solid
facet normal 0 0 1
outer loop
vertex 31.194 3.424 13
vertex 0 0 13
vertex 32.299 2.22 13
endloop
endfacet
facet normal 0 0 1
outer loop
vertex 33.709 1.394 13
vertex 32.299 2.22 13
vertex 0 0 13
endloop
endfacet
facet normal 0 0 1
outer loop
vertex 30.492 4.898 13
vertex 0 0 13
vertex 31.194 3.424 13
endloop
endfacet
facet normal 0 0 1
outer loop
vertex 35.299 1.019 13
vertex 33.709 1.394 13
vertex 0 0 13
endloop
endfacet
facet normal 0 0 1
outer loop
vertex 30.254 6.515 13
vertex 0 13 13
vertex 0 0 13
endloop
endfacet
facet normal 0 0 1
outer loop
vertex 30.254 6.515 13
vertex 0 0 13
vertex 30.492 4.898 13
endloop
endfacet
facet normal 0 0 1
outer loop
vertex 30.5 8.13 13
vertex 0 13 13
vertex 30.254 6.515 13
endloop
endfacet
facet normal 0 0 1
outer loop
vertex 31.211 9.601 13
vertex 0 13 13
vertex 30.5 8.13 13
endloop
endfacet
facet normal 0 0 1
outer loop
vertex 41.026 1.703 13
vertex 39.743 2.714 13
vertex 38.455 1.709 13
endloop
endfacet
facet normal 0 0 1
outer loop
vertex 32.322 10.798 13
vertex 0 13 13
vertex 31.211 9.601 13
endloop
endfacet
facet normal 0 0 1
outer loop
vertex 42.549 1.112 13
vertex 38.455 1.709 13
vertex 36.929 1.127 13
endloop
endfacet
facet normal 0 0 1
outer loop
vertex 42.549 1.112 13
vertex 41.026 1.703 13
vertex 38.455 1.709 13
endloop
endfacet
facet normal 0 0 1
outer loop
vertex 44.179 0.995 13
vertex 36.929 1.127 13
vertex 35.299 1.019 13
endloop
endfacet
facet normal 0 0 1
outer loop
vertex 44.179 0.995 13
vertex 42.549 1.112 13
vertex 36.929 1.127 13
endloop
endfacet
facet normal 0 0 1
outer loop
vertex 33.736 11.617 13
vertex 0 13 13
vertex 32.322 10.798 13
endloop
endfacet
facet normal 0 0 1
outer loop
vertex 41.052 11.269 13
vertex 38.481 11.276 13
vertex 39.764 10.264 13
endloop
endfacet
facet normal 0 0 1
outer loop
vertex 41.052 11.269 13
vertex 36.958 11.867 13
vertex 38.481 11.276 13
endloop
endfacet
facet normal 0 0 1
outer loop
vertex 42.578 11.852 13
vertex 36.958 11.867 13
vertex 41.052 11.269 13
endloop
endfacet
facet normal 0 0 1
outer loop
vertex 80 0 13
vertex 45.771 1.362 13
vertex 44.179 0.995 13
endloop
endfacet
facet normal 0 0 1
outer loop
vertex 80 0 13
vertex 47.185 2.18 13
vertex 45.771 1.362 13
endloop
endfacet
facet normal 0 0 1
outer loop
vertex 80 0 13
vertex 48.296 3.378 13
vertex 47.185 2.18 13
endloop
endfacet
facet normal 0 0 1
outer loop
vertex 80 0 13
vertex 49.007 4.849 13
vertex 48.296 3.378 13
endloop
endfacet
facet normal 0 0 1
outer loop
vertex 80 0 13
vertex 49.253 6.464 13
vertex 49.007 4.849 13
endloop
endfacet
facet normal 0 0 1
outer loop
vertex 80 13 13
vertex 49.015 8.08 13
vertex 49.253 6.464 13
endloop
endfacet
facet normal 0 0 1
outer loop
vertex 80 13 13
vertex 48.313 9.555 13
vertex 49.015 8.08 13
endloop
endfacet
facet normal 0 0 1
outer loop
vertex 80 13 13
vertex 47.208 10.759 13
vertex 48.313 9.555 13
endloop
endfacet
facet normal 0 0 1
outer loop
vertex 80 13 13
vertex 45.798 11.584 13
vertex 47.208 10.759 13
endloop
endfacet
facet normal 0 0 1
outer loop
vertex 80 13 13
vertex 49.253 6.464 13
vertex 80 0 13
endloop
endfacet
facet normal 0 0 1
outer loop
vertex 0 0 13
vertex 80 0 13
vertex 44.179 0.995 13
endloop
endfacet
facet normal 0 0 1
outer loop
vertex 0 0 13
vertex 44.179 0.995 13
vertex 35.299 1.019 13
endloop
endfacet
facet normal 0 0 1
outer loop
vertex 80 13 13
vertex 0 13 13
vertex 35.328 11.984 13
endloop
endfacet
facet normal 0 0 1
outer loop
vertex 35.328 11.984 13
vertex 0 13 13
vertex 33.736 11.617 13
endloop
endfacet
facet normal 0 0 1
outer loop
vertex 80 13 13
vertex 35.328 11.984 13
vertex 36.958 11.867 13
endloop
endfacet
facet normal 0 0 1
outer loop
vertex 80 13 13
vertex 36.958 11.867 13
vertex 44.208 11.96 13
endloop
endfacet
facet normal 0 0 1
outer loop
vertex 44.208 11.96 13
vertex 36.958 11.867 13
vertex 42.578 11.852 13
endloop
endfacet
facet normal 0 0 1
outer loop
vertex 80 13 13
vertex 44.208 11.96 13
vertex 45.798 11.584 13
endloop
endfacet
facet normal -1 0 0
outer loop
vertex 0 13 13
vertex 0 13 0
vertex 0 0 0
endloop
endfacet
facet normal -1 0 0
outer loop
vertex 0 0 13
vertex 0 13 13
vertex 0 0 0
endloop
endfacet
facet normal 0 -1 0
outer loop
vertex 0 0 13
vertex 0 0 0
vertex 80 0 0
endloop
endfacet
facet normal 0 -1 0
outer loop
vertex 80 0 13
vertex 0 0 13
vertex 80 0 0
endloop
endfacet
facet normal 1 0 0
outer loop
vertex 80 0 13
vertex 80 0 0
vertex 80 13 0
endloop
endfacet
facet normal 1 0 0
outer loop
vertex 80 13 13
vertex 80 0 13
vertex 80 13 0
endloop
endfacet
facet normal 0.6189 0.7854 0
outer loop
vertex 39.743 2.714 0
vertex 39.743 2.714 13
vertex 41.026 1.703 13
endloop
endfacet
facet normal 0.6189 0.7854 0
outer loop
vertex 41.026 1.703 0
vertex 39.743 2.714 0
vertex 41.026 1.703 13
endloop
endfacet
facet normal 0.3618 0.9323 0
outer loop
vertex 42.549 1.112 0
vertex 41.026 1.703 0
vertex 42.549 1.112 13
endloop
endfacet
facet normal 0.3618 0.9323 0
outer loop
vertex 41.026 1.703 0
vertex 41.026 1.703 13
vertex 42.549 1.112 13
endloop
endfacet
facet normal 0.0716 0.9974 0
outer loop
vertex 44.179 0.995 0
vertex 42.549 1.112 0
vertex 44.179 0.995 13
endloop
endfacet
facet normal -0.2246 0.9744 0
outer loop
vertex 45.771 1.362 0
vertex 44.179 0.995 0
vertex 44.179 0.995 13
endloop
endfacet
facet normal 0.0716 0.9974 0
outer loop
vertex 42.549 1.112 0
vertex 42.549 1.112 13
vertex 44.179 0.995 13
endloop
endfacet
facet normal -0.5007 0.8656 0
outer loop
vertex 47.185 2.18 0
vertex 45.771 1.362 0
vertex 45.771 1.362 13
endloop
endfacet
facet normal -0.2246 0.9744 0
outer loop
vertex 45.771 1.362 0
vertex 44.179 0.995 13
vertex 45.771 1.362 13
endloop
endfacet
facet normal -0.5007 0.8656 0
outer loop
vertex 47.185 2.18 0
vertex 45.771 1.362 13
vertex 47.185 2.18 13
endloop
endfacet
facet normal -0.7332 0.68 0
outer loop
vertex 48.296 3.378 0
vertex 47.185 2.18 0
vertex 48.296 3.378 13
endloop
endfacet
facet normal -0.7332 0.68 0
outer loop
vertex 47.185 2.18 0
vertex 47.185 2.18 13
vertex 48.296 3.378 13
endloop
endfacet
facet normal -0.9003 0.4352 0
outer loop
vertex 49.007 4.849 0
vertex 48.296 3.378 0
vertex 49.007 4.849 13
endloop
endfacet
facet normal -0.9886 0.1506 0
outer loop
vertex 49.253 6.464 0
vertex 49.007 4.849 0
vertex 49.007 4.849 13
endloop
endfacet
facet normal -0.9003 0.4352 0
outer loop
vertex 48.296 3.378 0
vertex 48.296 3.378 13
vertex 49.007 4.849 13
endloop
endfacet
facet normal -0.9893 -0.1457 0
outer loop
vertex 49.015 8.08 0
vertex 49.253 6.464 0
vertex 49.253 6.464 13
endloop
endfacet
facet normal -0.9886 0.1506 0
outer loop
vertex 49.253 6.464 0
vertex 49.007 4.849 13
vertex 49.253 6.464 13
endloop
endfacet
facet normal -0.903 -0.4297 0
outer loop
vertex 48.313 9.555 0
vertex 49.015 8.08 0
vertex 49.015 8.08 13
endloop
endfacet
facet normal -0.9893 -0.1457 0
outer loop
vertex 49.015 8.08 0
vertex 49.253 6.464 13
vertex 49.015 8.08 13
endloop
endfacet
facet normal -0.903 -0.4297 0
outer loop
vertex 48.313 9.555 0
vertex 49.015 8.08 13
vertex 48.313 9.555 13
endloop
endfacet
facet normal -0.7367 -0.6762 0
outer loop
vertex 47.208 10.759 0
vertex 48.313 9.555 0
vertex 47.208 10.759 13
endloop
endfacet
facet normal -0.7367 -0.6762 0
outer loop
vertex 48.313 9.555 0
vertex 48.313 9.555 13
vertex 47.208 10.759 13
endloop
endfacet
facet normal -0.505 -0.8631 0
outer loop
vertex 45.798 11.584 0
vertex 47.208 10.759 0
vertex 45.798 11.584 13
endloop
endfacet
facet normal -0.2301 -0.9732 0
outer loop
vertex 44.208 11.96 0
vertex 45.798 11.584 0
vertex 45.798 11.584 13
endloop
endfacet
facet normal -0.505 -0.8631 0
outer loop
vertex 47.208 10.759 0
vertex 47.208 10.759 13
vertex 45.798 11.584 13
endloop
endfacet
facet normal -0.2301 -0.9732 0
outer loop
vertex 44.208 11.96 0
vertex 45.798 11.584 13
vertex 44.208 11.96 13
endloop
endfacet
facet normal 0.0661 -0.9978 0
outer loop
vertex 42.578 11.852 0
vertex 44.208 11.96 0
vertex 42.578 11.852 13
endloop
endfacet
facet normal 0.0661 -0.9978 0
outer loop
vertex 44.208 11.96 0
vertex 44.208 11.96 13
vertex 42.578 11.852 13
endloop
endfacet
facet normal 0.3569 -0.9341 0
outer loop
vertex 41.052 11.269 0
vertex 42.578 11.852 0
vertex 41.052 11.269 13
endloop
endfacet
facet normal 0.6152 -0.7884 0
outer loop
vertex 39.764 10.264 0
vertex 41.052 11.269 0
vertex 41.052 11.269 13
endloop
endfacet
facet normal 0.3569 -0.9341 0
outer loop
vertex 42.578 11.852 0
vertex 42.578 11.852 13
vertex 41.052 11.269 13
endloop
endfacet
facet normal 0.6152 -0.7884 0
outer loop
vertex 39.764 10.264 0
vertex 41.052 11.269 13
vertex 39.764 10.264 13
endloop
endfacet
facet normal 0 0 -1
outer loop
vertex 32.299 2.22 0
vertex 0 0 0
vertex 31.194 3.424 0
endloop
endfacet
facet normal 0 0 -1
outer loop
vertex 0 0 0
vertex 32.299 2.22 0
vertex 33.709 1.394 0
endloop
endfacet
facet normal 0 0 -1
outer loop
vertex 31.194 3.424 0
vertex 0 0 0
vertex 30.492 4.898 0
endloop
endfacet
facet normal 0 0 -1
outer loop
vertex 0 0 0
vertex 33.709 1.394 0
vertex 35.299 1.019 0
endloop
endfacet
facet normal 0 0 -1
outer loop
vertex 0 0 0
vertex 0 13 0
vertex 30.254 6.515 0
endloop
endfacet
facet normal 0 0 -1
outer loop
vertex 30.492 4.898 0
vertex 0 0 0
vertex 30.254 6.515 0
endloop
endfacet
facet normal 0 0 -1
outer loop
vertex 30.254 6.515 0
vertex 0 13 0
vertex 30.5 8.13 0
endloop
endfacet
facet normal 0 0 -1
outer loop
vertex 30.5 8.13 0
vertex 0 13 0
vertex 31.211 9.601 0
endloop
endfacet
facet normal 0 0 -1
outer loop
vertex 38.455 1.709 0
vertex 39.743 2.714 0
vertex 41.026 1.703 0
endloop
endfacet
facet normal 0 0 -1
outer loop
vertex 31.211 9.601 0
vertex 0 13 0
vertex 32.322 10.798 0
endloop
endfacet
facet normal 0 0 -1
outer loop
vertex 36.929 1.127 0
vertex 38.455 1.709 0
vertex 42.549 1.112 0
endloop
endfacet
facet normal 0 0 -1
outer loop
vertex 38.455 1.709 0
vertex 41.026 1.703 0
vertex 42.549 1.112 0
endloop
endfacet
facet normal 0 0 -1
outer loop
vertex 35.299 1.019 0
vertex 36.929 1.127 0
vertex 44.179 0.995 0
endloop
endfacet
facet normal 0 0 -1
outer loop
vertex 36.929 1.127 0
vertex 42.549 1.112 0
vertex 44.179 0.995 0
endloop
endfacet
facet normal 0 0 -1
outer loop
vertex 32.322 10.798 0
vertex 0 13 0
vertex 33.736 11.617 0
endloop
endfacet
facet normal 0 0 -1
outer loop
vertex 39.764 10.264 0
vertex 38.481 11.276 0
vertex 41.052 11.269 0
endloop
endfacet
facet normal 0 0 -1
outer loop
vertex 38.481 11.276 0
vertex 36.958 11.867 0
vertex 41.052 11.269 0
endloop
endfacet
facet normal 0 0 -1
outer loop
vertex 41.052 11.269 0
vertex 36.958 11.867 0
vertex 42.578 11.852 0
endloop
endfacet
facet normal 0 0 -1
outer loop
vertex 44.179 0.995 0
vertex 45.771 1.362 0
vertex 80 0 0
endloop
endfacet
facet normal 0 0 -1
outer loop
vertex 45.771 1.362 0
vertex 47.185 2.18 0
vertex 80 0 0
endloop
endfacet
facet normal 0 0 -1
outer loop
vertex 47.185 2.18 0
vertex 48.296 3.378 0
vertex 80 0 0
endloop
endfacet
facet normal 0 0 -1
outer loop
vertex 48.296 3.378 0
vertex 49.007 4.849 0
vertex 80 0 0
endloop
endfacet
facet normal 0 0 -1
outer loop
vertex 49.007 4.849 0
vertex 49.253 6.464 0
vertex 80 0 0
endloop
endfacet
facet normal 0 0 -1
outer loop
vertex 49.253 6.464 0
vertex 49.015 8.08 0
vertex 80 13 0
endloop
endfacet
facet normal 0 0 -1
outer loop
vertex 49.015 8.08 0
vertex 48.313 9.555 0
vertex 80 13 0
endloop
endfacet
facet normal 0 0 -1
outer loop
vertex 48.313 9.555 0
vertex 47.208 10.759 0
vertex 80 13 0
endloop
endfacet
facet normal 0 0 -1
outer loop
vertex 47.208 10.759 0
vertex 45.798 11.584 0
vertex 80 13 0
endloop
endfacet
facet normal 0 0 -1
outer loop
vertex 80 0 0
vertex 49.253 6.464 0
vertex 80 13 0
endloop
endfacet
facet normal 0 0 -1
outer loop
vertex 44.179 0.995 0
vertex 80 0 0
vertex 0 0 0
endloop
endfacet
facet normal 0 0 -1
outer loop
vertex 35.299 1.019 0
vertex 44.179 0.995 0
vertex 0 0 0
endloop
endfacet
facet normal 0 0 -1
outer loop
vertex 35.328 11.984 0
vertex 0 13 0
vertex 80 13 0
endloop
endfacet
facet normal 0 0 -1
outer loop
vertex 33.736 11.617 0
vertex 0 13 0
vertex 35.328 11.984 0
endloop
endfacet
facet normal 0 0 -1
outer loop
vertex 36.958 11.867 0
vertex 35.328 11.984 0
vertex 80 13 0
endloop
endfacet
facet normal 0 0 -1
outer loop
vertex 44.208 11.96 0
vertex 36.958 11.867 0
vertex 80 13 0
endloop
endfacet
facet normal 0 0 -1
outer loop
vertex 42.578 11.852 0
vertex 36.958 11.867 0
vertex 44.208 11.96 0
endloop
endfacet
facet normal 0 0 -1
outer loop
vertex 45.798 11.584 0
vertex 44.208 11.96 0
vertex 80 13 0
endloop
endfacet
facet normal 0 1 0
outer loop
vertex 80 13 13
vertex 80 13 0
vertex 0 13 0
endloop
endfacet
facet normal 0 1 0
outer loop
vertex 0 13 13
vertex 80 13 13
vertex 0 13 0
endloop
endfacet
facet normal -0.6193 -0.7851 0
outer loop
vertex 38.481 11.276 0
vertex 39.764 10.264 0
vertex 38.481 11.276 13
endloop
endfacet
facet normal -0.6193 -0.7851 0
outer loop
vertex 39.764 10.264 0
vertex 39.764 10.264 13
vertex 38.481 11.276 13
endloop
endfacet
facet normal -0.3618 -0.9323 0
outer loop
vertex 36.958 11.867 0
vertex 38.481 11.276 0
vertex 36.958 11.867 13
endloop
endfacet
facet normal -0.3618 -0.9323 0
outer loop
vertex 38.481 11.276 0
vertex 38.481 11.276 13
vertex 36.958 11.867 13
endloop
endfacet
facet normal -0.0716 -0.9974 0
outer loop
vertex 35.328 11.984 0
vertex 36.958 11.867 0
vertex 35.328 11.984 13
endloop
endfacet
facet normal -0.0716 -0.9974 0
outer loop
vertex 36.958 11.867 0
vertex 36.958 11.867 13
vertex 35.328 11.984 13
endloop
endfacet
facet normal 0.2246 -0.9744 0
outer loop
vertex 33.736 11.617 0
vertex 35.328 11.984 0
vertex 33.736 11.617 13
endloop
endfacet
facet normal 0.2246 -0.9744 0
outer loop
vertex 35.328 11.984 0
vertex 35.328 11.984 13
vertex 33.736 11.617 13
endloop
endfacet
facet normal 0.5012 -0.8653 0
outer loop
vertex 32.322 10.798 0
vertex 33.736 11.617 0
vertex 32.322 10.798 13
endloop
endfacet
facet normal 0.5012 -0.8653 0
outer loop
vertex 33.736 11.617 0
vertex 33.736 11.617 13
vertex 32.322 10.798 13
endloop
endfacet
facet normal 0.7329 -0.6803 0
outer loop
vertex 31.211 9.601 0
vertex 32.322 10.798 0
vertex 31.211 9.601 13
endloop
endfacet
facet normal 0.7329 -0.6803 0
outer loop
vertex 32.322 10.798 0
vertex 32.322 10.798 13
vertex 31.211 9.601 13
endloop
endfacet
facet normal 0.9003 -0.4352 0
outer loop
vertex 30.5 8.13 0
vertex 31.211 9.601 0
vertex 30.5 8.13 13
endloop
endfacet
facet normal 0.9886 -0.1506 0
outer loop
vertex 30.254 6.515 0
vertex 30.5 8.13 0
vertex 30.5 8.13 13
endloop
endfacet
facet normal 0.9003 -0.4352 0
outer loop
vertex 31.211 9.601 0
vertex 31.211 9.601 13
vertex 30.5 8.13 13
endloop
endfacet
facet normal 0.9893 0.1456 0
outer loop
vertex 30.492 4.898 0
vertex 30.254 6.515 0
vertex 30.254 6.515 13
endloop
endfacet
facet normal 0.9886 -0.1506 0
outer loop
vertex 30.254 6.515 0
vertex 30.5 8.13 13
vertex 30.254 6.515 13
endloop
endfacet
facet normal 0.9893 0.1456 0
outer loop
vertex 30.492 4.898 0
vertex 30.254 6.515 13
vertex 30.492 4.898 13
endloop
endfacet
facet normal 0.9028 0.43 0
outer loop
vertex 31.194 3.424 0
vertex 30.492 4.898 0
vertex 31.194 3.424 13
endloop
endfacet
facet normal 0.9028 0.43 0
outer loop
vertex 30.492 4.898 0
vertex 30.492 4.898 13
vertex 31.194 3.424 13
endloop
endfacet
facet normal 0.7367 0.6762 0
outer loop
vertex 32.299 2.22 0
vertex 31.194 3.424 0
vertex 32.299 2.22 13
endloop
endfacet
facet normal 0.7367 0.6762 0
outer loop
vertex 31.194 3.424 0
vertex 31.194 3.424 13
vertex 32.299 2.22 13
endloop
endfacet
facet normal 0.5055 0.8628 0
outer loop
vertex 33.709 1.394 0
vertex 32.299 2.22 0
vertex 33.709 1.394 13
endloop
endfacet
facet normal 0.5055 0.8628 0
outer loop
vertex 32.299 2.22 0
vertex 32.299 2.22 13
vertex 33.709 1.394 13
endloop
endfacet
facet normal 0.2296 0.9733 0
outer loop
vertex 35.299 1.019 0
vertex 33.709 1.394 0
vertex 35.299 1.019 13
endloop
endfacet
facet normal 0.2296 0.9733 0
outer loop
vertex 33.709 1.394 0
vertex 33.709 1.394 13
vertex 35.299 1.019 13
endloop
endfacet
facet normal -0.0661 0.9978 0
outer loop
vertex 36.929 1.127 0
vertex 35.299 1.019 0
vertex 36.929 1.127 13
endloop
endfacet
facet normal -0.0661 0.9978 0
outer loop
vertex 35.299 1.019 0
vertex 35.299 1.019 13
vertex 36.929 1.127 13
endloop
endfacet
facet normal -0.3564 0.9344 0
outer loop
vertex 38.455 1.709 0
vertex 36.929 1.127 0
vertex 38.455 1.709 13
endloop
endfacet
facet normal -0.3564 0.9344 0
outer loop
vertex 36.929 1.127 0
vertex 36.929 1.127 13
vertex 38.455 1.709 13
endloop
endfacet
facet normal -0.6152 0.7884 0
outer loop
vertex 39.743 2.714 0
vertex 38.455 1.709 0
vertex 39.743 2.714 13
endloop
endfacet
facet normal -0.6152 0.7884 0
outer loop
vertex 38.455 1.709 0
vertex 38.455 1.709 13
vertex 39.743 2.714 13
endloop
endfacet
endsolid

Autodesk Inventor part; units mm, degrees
ref_plane "YZ Plane" through (0, 0, 0) normal (1, 0, 0) x (0, 1, 0)
ref_plane "XZ Plane" through (0, 0, 0) normal (0, 1, 0) x (-1, 0, 0)
ref_plane "XY Plane" through (0, 0, 0) normal (0, 0, 1) x (1, 0, 0)
sketch "Sketch1" plane through (0, 0, 0) normal (0, 0, 1) x (1, 0, 0)
  line L0 (0, 0) -> (80, 0)
  line L1 (80, 0) -> (80, 13)
  line L2 (80, 13) -> (0, 13)
  line L3 (0, 13) -> (0, 0)
  dimension "d0" = 80
  dimension "d1" = 13
extrude "Extrusion1" add sketch "Sketch1" along normal blind 13
sketch "Sketch2" plane through (0, 0, 13) normal (0, 0, 1) x (1, 0, 0)
  circle A0 centre (35.7535, 6.5) radius 5.5
  circle A1 centre (43.7535, 6.4786) radius 5.5
  line L0 (80, 13) -> (0, 13) projected
  line L1 (80, 0) -> (80, 13) projected
  line L2 (0, 13) -> (0, 0) projected
  line L3 (80, 0) -> (80, 13) projected
  line L4 (80, 13) -> (0, 13) projected
  line L5 (0, 13) -> (0, 0) projected
  line L6 (0, 0) -> (80, 0) projected
  point P0 (39.7636, 10.2642)
  point P1 (39.7434, 2.7144)
  point P2 (40, 13)
  dimension "d14" = 13
  dimension "d15" = 80
  dimension "d17" = 40
  dimension "d18" = 19
  dimension "d19" = 6.5
  dimension "d20" = 8
extrude "Extrusion2" cut sketch "Sketch2" against normal blind 13 contours A0 A1 | A0 A1 | A1 A0
properties part number "Weight_Sensor"
